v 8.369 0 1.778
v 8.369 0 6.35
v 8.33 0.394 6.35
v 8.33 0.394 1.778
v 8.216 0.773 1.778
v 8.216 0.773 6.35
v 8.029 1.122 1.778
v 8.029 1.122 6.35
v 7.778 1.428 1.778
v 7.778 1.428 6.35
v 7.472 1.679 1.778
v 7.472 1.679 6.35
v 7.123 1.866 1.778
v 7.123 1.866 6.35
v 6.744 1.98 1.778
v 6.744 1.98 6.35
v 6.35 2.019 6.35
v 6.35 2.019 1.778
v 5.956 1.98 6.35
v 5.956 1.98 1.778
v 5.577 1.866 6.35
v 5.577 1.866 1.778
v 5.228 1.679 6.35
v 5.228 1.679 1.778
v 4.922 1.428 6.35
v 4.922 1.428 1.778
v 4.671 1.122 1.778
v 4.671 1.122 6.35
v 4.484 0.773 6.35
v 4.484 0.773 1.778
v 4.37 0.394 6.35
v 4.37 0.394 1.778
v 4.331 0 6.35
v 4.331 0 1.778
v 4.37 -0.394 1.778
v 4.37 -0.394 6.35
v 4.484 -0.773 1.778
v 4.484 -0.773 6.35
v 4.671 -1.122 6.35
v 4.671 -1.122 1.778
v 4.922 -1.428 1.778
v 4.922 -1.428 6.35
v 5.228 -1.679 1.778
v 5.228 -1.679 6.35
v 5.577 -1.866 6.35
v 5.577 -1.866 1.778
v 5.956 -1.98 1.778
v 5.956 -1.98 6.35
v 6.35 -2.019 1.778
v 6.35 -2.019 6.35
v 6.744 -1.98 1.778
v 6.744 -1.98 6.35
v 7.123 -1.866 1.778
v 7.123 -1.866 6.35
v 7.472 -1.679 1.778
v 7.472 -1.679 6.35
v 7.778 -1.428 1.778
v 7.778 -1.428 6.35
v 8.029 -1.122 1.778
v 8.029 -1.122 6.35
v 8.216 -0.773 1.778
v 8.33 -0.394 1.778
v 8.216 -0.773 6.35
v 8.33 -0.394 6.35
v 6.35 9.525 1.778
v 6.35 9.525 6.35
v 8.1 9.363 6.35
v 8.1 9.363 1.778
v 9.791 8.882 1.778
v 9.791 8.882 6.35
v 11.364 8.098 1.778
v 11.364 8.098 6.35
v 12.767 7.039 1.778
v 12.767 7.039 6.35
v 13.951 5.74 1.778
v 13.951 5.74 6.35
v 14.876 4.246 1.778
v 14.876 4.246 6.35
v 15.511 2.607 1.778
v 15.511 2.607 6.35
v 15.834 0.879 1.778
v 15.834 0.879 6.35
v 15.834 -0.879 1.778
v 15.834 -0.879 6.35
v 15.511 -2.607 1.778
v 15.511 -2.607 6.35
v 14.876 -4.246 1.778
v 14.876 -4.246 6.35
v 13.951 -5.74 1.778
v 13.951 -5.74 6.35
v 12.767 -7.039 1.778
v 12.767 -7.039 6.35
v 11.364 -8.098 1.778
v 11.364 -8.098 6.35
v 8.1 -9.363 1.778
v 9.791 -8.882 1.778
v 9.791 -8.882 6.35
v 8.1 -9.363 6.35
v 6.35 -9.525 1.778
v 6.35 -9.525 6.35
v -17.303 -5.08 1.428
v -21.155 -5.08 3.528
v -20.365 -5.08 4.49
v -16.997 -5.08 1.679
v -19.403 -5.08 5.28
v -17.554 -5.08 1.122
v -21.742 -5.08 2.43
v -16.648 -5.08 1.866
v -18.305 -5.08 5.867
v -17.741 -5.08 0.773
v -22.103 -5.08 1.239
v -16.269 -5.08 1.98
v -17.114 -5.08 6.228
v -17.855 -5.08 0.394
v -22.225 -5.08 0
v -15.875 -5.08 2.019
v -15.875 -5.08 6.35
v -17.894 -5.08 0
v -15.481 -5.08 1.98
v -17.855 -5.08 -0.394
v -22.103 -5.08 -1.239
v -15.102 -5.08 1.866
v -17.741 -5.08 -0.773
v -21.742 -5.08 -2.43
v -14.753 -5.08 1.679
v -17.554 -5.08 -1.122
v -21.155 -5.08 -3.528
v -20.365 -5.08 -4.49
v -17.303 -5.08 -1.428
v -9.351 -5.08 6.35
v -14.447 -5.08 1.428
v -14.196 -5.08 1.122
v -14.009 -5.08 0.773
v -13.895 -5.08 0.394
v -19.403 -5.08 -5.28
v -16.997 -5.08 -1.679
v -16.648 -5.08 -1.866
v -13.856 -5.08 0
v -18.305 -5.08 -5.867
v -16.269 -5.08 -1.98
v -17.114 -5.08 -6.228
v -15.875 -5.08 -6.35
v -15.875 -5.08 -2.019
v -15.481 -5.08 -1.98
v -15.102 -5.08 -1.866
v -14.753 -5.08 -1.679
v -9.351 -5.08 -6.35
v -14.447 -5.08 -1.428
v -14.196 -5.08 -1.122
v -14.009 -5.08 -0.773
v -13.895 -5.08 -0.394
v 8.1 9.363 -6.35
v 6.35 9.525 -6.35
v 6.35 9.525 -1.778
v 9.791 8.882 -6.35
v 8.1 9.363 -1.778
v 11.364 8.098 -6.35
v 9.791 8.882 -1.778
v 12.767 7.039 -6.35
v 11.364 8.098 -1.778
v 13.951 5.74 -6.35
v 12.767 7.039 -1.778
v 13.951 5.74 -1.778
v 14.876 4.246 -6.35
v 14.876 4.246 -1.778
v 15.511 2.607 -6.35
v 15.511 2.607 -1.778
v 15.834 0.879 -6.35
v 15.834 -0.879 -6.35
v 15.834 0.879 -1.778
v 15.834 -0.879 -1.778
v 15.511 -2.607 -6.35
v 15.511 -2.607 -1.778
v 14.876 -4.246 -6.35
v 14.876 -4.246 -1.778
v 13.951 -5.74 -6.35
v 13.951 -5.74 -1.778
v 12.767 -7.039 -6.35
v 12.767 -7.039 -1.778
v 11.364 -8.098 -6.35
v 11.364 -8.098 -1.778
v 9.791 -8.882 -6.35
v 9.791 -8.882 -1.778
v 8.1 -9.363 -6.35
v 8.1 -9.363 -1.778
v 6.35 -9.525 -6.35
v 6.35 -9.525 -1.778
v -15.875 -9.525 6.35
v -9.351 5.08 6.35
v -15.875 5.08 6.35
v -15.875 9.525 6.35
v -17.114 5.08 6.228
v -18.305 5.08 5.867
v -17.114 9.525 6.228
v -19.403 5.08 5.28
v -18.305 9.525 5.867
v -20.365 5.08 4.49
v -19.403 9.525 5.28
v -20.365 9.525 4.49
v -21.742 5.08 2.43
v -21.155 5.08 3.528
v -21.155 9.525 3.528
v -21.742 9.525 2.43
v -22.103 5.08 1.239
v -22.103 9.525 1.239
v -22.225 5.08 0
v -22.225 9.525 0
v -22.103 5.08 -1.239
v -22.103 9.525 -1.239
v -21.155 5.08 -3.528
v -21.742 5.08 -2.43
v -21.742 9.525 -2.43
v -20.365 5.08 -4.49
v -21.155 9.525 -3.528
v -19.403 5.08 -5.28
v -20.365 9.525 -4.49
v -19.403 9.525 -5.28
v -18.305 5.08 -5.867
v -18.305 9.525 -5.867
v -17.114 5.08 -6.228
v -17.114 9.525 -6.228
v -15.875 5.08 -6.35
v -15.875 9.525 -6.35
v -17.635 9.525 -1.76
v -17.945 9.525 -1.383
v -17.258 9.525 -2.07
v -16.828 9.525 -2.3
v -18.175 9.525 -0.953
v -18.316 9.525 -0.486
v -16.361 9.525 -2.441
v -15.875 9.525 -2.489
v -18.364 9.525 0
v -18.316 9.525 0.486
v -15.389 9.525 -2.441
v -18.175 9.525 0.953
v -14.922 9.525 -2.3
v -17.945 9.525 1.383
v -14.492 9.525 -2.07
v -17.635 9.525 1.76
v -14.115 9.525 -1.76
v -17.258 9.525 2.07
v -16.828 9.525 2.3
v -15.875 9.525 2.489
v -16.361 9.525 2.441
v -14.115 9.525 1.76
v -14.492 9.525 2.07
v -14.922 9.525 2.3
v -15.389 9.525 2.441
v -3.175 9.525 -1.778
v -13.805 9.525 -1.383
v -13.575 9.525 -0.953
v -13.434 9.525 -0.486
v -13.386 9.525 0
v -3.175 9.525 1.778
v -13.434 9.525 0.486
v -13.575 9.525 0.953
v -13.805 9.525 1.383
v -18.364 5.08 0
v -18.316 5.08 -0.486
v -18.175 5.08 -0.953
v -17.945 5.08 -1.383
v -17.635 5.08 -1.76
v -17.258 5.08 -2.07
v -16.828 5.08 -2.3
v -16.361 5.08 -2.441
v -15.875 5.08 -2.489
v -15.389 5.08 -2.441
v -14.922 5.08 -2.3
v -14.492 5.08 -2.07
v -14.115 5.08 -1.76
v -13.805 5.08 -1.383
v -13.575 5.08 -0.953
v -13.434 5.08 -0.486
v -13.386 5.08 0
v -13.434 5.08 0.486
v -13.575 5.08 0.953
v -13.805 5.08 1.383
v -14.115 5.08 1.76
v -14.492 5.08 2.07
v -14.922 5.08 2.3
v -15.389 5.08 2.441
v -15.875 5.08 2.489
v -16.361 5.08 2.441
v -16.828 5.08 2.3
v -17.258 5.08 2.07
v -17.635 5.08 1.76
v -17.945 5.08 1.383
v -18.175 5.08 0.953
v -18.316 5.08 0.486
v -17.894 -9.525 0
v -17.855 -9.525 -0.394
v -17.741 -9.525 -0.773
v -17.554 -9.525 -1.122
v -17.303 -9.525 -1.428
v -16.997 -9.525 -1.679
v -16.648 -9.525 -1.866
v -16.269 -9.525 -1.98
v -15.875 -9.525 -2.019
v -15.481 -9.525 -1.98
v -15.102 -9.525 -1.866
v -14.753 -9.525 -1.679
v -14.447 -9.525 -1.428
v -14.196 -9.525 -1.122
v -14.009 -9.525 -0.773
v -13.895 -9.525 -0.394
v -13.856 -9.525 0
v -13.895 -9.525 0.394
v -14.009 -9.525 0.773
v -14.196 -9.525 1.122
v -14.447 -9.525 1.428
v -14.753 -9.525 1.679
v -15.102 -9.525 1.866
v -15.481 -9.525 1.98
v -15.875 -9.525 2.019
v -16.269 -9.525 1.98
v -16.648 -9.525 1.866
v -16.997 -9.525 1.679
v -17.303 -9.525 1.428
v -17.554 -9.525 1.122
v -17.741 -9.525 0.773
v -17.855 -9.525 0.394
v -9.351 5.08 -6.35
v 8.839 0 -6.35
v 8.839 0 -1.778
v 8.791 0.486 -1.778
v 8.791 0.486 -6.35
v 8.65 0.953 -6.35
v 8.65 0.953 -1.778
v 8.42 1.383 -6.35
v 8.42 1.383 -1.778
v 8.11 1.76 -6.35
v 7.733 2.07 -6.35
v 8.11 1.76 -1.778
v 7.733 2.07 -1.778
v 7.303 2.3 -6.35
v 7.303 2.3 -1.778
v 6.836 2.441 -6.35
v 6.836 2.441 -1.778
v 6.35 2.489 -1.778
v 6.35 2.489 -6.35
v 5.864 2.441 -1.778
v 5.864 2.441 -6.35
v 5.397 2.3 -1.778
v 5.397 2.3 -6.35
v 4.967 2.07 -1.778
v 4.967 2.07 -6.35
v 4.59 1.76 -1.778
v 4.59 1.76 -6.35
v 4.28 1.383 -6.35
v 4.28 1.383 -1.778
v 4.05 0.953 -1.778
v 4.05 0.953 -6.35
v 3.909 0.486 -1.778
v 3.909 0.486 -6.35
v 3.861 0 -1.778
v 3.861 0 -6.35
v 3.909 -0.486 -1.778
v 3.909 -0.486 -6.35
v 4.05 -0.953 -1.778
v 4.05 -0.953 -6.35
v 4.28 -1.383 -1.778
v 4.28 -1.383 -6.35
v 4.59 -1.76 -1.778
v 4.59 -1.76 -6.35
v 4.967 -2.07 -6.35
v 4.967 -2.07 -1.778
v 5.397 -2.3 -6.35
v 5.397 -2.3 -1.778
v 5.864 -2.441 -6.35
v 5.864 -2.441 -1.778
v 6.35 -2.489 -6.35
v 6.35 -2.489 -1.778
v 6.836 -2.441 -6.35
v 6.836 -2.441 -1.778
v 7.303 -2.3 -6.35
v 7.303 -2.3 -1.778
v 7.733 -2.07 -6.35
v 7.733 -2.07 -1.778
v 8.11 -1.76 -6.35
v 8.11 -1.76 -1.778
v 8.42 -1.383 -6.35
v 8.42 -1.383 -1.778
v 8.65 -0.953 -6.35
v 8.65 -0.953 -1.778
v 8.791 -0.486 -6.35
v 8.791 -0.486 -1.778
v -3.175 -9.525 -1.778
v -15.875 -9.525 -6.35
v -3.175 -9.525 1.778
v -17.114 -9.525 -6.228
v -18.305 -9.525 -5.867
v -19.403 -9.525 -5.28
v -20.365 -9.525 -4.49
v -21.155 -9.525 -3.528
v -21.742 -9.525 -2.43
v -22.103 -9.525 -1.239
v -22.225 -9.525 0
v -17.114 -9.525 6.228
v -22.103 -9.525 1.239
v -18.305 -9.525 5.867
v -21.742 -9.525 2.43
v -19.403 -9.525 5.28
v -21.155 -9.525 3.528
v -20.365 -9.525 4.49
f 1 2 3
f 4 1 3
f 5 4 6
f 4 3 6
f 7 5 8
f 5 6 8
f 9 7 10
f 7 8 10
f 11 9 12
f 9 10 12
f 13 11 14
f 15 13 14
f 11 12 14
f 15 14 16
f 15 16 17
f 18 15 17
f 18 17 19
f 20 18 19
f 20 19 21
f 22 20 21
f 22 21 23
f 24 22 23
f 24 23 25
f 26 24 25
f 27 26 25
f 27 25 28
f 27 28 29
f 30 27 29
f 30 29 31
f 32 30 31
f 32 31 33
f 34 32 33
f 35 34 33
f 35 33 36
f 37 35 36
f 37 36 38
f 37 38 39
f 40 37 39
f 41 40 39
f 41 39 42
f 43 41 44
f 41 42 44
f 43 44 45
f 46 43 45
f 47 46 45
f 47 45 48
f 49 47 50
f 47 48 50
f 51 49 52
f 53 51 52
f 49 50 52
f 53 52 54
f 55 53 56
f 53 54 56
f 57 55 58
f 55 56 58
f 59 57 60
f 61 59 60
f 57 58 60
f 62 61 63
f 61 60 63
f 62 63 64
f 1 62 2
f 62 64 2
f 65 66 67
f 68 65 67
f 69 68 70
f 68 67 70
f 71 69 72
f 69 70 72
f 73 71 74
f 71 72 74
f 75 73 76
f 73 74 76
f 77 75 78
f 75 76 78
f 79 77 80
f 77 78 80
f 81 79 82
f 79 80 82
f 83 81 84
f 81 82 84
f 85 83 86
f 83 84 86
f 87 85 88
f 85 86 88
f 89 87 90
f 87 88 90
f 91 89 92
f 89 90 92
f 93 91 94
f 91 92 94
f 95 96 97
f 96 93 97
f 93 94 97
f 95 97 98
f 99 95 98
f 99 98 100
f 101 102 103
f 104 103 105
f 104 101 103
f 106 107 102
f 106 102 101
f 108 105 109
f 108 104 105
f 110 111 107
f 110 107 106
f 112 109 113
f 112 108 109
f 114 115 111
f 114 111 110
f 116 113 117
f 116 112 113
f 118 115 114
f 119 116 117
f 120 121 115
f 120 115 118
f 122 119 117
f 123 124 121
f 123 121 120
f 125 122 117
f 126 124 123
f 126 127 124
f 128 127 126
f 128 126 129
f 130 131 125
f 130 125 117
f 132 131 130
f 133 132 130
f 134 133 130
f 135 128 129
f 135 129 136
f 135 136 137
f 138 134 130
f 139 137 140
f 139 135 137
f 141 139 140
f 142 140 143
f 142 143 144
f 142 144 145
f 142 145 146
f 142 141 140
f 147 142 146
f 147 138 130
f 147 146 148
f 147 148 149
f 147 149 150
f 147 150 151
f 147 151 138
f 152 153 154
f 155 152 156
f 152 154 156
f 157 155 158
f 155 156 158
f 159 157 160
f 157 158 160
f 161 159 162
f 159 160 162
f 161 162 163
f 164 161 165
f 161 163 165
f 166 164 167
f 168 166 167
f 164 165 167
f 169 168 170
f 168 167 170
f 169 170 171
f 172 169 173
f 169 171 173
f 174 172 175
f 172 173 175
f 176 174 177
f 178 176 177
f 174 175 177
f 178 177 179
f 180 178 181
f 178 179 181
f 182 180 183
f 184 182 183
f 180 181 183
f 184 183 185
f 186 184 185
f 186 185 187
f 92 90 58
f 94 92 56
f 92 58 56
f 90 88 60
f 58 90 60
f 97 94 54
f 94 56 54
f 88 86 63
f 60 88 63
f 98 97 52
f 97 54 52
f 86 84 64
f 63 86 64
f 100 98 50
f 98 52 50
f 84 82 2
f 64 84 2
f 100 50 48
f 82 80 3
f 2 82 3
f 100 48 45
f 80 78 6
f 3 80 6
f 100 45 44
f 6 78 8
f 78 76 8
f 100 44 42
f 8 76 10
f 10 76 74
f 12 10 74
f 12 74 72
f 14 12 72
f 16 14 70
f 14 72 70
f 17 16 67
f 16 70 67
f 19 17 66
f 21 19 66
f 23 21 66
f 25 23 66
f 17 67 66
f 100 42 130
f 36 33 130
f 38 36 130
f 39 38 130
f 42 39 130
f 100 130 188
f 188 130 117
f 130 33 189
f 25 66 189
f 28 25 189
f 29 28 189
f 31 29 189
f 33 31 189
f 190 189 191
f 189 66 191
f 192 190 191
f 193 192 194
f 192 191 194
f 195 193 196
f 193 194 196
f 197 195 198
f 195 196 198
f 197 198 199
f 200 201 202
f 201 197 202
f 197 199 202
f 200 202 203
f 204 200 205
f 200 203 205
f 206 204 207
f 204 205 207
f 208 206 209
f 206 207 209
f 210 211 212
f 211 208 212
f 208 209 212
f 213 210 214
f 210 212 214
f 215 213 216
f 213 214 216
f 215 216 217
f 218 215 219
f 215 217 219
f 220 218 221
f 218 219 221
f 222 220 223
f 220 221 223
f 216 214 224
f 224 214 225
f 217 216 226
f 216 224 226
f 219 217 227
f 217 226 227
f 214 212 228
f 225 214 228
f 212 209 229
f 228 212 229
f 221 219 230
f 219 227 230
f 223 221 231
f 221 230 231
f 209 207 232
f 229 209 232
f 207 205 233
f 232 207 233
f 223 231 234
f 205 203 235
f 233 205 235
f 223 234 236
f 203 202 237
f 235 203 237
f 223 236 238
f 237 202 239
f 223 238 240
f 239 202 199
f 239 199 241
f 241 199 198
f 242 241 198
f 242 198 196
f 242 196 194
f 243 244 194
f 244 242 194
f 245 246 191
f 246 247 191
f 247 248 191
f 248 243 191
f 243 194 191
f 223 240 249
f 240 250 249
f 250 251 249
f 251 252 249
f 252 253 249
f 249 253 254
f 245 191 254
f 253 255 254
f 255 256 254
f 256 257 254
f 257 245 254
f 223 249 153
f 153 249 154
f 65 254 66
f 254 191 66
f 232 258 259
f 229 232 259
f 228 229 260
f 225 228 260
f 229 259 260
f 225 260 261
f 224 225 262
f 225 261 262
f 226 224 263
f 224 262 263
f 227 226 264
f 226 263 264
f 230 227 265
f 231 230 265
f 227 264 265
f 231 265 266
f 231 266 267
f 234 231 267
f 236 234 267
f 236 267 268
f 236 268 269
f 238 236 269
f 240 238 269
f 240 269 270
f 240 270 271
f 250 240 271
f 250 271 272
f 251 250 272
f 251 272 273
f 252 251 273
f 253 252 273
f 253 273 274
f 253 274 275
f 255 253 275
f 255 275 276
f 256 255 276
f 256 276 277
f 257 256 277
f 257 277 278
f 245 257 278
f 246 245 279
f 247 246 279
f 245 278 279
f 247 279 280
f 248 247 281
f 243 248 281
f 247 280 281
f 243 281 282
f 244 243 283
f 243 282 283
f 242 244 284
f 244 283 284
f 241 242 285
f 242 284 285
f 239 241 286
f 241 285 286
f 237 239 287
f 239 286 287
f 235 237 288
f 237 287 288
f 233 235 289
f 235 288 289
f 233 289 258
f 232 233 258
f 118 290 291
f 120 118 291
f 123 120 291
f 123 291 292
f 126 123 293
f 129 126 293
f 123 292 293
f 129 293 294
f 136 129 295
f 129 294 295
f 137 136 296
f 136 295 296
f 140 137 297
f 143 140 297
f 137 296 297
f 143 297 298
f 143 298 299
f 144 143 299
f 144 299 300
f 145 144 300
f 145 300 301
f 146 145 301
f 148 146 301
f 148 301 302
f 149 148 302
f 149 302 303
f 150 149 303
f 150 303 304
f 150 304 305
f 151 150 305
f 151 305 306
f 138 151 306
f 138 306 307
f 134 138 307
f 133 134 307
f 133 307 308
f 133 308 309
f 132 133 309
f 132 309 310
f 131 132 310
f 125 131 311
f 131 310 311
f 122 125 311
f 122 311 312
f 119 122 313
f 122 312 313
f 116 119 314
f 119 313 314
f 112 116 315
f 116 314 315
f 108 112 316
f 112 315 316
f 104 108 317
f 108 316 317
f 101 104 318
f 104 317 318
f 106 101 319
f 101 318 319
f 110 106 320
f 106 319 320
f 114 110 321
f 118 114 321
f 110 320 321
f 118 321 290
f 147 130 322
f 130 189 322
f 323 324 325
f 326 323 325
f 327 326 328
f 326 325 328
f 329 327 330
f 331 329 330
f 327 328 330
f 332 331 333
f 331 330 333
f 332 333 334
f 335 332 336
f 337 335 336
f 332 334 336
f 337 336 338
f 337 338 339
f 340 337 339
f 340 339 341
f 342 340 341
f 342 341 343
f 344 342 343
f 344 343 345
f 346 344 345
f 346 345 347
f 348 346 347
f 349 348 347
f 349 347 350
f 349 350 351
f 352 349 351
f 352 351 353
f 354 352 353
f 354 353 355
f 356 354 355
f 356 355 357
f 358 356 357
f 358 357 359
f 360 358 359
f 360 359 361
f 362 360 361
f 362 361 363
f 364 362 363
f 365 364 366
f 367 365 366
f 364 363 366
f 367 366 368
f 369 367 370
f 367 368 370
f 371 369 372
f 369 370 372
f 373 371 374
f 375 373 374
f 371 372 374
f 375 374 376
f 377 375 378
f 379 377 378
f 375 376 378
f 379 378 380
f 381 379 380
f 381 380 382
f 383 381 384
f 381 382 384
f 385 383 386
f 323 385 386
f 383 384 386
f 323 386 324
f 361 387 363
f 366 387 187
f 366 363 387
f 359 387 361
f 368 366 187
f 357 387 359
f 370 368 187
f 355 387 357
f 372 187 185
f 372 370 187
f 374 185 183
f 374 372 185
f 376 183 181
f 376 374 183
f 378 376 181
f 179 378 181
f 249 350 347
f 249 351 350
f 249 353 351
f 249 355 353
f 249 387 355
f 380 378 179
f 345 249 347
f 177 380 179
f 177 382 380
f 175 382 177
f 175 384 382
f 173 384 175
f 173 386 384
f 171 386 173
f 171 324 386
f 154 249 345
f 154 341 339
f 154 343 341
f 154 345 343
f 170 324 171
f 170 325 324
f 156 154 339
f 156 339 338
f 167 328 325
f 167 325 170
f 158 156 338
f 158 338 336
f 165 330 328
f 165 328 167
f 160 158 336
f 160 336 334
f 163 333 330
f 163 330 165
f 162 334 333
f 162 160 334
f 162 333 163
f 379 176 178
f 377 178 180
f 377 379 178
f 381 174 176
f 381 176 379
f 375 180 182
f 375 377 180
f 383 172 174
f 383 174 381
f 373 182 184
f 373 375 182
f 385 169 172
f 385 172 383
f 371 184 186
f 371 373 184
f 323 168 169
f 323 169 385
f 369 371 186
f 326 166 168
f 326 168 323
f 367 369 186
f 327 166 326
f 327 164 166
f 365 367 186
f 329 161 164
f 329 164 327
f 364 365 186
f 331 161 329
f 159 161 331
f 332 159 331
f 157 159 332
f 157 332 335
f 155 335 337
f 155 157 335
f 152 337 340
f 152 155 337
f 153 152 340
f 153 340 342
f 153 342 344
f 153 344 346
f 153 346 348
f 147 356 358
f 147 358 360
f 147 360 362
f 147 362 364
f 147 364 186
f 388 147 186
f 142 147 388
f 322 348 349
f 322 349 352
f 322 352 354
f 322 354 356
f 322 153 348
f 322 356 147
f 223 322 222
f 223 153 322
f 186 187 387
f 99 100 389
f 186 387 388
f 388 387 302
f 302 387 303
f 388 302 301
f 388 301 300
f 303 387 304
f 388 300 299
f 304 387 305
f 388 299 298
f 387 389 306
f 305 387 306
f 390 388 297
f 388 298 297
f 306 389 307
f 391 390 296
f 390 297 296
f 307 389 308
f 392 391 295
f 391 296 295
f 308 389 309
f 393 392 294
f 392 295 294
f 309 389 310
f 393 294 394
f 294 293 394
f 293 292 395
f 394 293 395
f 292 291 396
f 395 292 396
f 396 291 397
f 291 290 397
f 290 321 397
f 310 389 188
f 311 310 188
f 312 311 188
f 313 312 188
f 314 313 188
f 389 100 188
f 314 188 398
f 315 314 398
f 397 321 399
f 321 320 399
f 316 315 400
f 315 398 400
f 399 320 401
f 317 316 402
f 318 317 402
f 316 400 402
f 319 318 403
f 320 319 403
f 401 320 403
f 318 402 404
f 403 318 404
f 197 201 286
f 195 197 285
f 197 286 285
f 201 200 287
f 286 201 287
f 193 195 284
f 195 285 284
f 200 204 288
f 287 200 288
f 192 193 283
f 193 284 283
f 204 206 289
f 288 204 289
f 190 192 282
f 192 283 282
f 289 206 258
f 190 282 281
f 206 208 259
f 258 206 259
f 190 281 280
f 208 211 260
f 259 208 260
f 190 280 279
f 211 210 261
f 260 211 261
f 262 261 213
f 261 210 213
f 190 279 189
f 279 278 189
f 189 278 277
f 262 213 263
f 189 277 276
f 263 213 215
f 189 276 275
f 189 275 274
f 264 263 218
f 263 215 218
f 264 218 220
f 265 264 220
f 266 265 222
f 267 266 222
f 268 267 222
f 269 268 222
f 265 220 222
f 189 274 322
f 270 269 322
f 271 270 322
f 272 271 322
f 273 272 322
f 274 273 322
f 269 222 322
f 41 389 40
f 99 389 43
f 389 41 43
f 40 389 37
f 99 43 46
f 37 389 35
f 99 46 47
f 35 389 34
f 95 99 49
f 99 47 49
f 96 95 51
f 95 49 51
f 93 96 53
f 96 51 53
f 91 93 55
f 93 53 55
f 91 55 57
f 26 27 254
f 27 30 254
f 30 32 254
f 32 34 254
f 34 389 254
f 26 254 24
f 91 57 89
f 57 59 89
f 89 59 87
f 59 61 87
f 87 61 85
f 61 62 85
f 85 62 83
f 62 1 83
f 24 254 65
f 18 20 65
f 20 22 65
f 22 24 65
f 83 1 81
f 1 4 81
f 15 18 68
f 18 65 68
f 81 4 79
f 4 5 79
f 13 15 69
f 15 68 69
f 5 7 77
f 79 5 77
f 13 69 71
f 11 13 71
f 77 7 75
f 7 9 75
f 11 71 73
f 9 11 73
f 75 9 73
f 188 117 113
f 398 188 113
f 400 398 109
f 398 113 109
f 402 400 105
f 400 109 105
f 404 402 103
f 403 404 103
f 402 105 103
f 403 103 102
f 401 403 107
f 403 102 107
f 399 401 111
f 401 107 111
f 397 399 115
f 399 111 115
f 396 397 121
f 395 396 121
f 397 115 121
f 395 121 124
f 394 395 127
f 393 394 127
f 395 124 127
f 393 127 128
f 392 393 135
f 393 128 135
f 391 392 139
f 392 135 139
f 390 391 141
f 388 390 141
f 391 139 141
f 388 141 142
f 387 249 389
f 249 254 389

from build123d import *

# Parameters (mm, degrees)
BOSS_EXTRUDE1_DEPTH        = 9.525
BOSS_EXTRUDE2_DEPTH        = 12.7
CUT_EXTRUDE1_DEPTH         = 5.08
F_10_32_TAPPED_HOLE1_D     = 4.0386
F_10_32_TAPPED_HOLE1_DEPTH = 4.445
F_10_CLEARANCE_HOLE1_D     = 4.9784
F_10_CLEARANCE_HOLE1_DEPTH = 14.604
CUT_EXTRUDE2_DEPTH         = 1.778
F_10_CLEARANCE_HOLE2_D     = 4.9784
F_10_CLEARANCE_HOLE2_DEPTH = 8.127
F_10_32_TAPPED_HOLE2_D     = 4.0386


with BuildPart() as part:
    # Sketch1 → Boss-Extrude1 (new, symmetric)
    with BuildSketch(Plane(origin=(0, 0, 0), x_dir=(1, 0, 0), z_dir=(0, 1, 0))):
        with BuildLine():
            Line((0, -6.35), (-15.875, -6.35))
            ThreePointArc((-15.875, -6.35), (-22.225, 0), (-15.875, 6.35))
            Line((-15.875, 6.35), (0, 6.35))
            Line((0, 6.35), (0, -6.35))
        make_face()
    extrude(amount=BOSS_EXTRUDE1_DEPTH, both=True)

    # Sketch2 → Boss-Extrude2 (add)
    with BuildSketch(Plane.XY.offset(6.35)):
        with BuildLine():
            Line((0, 9.525), (6.35, 9.525))
            ThreePointArc((6.35, 9.525), (15.875, 0), (6.35, -9.525))
            Line((6.35, -9.525), (0, -9.525))
            ThreePointArc((0, -9.525), (-9.525, 0), (0, 9.525))
        make_face()
    extrude(amount=-BOSS_EXTRUDE2_DEPTH)

    # Sketch3 → Cut-Extrude1 (cut, symmetric)
    with BuildSketch(Plane(origin=(0, 0, 0), x_dir=(1, 0, 0), z_dir=(0, 1, 0))):
        with BuildLine():
            Line((-9.351499966, 6.35), (-15.875, 6.35))
            ThreePointArc((-15.875, 6.35), (-22.225, 0), (-15.875, -6.35))
            Line((-15.875, -6.35), (-9.351499966, -6.35))
            Line((-9.351499966, -6.35), (-9.351499966, 6.35))
        make_face()
    extrude(amount=CUT_EXTRUDE1_DEPTH, both=True, mode=Mode.SUBTRACT)

    # #10-32 Tapped Hole1
    with Locations(Plane(origin=(0, -5.08, 0), x_dir=(1, 0, 0), z_dir=(0, 1, 0))):
        with Locations((-15.875, 0)):
            Hole(F_10_32_TAPPED_HOLE1_D / 2, depth=F_10_32_TAPPED_HOLE1_DEPTH)

    # #10 Clearance Hole1
    with Locations(Plane(origin=(0, 9.525, 0), x_dir=(1, 0, 0), z_dir=(0, 1, 0))):
        with Locations((-15.875, 0)):
            Hole(F_10_CLEARANCE_HOLE1_D / 2, depth=F_10_CLEARANCE_HOLE1_DEPTH)

    # Sketch9 → Cut-Extrude2 (cut, symmetric)
    with BuildSketch(Plane.XY):
        with BuildLine():
            Line((-3.175, 0), (-3.175, -9.525))
            Line((-3.175, -9.525), (6.35, -9.525))
            ThreePointArc((6.35, -9.525), (15.875, 0), (6.35, 9.525))
            Line((6.35, 9.525), (-3.175, 9.525))
            Line((-3.175, 9.525), (-3.175, 0))
        make_face()
    extrude(amount=CUT_EXTRUDE2_DEPTH, both=True, mode=Mode.SUBTRACT)

    # #10 Clearance Hole2
    with Locations(Plane(origin=(0, 0, -6.35), x_dir=(-1, 0, 0), z_dir=(0, 0, -1))):
        with Locations((-6.35, 0)):
            Hole(F_10_CLEARANCE_HOLE2_D / 2, depth=F_10_CLEARANCE_HOLE2_DEPTH)

    # #10-32 Tapped Hole2 (through all)
    with Locations(Plane(origin=(0, 0, 1.778), x_dir=(-1, 0, 0), z_dir=(0, 0, -1))):
        with Locations((-6.35, 0)):
            Hole(F_10_32_TAPPED_HOLE2_D / 2)


solid = part.part
